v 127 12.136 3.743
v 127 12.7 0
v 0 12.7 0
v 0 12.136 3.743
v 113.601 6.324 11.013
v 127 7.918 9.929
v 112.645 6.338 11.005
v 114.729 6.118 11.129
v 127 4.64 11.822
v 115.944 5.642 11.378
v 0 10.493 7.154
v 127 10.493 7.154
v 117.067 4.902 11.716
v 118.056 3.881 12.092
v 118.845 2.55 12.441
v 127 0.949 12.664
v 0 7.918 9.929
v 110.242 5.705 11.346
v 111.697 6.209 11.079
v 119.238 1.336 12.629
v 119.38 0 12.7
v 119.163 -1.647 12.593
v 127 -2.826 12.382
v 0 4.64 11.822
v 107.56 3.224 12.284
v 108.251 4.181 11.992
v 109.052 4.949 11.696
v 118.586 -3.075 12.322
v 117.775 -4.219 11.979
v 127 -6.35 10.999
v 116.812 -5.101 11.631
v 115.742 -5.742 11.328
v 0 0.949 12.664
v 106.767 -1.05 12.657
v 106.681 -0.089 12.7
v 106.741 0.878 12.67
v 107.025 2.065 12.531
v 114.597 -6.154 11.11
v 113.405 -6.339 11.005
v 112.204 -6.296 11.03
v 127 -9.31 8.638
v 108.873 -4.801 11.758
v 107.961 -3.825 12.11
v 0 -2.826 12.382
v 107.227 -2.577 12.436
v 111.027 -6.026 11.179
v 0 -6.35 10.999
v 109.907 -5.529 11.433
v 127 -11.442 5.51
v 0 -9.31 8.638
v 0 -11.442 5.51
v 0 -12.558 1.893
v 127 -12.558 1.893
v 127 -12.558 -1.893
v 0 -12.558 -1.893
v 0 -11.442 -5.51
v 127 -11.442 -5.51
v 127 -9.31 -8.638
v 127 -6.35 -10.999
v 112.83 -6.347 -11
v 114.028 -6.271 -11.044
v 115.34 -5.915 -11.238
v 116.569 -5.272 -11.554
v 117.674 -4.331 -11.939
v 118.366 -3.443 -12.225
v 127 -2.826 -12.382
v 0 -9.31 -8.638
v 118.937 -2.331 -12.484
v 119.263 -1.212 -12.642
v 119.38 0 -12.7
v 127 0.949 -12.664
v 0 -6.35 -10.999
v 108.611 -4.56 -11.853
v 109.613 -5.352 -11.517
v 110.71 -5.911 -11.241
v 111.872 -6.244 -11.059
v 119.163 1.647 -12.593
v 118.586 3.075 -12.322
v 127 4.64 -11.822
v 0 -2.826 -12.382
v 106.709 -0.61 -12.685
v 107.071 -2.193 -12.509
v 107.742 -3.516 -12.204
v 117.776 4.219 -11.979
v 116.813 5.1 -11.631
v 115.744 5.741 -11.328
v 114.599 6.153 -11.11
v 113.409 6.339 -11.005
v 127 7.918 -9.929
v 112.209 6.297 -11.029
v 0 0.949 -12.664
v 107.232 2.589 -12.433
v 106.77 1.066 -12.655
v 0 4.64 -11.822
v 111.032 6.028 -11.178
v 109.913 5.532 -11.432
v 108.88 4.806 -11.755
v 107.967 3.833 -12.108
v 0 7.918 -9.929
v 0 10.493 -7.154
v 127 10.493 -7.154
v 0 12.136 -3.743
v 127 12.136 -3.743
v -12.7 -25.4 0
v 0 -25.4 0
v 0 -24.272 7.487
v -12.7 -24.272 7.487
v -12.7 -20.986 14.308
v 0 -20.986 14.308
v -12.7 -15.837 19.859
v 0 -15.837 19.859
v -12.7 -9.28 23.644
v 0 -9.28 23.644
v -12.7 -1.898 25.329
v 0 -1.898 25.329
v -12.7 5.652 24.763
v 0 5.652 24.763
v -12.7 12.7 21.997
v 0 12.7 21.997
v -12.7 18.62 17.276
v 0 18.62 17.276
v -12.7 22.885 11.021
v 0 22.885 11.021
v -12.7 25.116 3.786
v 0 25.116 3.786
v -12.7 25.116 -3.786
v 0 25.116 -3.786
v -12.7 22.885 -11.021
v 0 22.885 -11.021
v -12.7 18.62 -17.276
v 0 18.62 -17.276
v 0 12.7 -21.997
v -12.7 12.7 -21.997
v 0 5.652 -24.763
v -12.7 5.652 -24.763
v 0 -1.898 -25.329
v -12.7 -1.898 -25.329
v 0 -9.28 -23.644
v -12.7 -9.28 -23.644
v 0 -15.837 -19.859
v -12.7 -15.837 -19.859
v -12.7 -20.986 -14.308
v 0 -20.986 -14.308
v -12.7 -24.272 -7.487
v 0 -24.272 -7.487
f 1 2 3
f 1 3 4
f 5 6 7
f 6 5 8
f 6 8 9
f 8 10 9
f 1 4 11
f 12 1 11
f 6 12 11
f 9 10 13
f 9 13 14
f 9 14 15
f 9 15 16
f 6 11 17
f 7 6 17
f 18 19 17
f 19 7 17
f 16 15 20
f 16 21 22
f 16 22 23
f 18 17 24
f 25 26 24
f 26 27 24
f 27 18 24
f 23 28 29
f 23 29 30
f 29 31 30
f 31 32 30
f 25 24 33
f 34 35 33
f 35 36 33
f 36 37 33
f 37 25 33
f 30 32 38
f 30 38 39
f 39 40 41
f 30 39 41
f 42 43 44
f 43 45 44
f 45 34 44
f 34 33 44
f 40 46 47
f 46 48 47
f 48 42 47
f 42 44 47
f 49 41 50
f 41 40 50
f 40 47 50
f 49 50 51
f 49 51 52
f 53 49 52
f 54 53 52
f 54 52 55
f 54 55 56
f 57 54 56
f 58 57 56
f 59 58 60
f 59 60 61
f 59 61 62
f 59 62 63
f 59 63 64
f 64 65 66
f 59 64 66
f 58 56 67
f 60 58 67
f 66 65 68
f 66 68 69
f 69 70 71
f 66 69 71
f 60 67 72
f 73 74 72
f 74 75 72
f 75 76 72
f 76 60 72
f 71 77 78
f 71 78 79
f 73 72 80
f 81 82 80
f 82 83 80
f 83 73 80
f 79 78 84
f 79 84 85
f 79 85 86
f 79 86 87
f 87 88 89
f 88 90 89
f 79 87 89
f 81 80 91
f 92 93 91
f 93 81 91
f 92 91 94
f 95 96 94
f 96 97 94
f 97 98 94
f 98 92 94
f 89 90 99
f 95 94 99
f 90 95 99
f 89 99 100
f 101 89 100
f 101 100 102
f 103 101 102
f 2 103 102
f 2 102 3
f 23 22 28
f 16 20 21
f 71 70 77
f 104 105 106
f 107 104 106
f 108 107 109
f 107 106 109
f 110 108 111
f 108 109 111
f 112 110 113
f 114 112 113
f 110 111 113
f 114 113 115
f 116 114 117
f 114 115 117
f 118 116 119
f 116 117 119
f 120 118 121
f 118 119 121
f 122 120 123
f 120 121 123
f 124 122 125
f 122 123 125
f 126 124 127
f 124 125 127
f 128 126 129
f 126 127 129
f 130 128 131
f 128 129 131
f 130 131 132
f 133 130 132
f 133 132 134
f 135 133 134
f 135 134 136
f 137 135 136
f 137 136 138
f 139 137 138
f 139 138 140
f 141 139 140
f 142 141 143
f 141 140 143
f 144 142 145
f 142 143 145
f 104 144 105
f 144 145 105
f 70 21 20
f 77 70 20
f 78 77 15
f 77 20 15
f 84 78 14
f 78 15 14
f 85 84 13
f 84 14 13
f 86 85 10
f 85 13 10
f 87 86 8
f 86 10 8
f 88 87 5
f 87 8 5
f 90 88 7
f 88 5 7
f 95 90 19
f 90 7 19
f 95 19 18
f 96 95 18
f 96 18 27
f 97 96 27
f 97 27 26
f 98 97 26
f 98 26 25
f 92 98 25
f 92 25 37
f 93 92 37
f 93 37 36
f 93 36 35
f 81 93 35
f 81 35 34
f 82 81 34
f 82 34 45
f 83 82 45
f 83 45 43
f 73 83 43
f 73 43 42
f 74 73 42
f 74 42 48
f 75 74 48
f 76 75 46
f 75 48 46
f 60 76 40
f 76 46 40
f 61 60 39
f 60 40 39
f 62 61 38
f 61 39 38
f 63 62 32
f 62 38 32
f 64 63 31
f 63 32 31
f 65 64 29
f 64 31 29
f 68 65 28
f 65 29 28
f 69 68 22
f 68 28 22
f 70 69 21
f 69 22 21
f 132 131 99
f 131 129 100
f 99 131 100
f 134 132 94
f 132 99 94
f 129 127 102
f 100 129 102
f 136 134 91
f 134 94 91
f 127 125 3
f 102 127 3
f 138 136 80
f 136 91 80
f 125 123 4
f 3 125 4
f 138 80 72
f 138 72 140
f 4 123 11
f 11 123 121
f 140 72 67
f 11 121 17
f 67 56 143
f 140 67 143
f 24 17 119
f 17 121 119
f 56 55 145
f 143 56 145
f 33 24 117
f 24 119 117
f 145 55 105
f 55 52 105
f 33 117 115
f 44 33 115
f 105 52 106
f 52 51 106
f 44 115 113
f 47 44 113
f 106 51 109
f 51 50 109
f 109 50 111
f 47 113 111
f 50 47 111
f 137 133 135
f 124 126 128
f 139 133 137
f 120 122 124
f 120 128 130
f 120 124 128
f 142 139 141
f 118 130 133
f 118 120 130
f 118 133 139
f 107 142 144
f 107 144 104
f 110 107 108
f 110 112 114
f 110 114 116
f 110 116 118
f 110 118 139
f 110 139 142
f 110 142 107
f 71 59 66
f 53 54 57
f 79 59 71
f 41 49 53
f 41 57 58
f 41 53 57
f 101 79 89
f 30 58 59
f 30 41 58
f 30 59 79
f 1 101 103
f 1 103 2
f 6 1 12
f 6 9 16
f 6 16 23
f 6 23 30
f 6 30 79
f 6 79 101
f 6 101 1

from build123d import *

# Parameters (mm, degrees)
F0_R     = 12.7
F1_DEPTH = 127
F2_R     = 25.4
F3_DEPTH = 12.7
F5_R     = 6.35
F6_DEPTH = 38.101


with BuildPart() as f1:
    # F0 (on Right) → F1 (new body)
    with BuildSketch(Plane.YZ):
        Circle(F0_R)
    extrude(amount=F1_DEPTH)

    # F2 (on face) → F3 (join)
    with BuildSketch(Plane(origin=(0, 0, 0), x_dir=(0, -1, 0), z_dir=(-1, 0, 0))):
        Circle(F2_R)
    extrude(amount=F3_DEPTH)

    # F5 (on offset) → F6 (cut, through all)
    with BuildSketch(Plane.XY.offset(12.7)):
        with Locations((113.03, 0)):
            Circle(F5_R)
    extrude(amount=-F6_DEPTH, mode=Mode.SUBTRACT)


solid = f1.part
